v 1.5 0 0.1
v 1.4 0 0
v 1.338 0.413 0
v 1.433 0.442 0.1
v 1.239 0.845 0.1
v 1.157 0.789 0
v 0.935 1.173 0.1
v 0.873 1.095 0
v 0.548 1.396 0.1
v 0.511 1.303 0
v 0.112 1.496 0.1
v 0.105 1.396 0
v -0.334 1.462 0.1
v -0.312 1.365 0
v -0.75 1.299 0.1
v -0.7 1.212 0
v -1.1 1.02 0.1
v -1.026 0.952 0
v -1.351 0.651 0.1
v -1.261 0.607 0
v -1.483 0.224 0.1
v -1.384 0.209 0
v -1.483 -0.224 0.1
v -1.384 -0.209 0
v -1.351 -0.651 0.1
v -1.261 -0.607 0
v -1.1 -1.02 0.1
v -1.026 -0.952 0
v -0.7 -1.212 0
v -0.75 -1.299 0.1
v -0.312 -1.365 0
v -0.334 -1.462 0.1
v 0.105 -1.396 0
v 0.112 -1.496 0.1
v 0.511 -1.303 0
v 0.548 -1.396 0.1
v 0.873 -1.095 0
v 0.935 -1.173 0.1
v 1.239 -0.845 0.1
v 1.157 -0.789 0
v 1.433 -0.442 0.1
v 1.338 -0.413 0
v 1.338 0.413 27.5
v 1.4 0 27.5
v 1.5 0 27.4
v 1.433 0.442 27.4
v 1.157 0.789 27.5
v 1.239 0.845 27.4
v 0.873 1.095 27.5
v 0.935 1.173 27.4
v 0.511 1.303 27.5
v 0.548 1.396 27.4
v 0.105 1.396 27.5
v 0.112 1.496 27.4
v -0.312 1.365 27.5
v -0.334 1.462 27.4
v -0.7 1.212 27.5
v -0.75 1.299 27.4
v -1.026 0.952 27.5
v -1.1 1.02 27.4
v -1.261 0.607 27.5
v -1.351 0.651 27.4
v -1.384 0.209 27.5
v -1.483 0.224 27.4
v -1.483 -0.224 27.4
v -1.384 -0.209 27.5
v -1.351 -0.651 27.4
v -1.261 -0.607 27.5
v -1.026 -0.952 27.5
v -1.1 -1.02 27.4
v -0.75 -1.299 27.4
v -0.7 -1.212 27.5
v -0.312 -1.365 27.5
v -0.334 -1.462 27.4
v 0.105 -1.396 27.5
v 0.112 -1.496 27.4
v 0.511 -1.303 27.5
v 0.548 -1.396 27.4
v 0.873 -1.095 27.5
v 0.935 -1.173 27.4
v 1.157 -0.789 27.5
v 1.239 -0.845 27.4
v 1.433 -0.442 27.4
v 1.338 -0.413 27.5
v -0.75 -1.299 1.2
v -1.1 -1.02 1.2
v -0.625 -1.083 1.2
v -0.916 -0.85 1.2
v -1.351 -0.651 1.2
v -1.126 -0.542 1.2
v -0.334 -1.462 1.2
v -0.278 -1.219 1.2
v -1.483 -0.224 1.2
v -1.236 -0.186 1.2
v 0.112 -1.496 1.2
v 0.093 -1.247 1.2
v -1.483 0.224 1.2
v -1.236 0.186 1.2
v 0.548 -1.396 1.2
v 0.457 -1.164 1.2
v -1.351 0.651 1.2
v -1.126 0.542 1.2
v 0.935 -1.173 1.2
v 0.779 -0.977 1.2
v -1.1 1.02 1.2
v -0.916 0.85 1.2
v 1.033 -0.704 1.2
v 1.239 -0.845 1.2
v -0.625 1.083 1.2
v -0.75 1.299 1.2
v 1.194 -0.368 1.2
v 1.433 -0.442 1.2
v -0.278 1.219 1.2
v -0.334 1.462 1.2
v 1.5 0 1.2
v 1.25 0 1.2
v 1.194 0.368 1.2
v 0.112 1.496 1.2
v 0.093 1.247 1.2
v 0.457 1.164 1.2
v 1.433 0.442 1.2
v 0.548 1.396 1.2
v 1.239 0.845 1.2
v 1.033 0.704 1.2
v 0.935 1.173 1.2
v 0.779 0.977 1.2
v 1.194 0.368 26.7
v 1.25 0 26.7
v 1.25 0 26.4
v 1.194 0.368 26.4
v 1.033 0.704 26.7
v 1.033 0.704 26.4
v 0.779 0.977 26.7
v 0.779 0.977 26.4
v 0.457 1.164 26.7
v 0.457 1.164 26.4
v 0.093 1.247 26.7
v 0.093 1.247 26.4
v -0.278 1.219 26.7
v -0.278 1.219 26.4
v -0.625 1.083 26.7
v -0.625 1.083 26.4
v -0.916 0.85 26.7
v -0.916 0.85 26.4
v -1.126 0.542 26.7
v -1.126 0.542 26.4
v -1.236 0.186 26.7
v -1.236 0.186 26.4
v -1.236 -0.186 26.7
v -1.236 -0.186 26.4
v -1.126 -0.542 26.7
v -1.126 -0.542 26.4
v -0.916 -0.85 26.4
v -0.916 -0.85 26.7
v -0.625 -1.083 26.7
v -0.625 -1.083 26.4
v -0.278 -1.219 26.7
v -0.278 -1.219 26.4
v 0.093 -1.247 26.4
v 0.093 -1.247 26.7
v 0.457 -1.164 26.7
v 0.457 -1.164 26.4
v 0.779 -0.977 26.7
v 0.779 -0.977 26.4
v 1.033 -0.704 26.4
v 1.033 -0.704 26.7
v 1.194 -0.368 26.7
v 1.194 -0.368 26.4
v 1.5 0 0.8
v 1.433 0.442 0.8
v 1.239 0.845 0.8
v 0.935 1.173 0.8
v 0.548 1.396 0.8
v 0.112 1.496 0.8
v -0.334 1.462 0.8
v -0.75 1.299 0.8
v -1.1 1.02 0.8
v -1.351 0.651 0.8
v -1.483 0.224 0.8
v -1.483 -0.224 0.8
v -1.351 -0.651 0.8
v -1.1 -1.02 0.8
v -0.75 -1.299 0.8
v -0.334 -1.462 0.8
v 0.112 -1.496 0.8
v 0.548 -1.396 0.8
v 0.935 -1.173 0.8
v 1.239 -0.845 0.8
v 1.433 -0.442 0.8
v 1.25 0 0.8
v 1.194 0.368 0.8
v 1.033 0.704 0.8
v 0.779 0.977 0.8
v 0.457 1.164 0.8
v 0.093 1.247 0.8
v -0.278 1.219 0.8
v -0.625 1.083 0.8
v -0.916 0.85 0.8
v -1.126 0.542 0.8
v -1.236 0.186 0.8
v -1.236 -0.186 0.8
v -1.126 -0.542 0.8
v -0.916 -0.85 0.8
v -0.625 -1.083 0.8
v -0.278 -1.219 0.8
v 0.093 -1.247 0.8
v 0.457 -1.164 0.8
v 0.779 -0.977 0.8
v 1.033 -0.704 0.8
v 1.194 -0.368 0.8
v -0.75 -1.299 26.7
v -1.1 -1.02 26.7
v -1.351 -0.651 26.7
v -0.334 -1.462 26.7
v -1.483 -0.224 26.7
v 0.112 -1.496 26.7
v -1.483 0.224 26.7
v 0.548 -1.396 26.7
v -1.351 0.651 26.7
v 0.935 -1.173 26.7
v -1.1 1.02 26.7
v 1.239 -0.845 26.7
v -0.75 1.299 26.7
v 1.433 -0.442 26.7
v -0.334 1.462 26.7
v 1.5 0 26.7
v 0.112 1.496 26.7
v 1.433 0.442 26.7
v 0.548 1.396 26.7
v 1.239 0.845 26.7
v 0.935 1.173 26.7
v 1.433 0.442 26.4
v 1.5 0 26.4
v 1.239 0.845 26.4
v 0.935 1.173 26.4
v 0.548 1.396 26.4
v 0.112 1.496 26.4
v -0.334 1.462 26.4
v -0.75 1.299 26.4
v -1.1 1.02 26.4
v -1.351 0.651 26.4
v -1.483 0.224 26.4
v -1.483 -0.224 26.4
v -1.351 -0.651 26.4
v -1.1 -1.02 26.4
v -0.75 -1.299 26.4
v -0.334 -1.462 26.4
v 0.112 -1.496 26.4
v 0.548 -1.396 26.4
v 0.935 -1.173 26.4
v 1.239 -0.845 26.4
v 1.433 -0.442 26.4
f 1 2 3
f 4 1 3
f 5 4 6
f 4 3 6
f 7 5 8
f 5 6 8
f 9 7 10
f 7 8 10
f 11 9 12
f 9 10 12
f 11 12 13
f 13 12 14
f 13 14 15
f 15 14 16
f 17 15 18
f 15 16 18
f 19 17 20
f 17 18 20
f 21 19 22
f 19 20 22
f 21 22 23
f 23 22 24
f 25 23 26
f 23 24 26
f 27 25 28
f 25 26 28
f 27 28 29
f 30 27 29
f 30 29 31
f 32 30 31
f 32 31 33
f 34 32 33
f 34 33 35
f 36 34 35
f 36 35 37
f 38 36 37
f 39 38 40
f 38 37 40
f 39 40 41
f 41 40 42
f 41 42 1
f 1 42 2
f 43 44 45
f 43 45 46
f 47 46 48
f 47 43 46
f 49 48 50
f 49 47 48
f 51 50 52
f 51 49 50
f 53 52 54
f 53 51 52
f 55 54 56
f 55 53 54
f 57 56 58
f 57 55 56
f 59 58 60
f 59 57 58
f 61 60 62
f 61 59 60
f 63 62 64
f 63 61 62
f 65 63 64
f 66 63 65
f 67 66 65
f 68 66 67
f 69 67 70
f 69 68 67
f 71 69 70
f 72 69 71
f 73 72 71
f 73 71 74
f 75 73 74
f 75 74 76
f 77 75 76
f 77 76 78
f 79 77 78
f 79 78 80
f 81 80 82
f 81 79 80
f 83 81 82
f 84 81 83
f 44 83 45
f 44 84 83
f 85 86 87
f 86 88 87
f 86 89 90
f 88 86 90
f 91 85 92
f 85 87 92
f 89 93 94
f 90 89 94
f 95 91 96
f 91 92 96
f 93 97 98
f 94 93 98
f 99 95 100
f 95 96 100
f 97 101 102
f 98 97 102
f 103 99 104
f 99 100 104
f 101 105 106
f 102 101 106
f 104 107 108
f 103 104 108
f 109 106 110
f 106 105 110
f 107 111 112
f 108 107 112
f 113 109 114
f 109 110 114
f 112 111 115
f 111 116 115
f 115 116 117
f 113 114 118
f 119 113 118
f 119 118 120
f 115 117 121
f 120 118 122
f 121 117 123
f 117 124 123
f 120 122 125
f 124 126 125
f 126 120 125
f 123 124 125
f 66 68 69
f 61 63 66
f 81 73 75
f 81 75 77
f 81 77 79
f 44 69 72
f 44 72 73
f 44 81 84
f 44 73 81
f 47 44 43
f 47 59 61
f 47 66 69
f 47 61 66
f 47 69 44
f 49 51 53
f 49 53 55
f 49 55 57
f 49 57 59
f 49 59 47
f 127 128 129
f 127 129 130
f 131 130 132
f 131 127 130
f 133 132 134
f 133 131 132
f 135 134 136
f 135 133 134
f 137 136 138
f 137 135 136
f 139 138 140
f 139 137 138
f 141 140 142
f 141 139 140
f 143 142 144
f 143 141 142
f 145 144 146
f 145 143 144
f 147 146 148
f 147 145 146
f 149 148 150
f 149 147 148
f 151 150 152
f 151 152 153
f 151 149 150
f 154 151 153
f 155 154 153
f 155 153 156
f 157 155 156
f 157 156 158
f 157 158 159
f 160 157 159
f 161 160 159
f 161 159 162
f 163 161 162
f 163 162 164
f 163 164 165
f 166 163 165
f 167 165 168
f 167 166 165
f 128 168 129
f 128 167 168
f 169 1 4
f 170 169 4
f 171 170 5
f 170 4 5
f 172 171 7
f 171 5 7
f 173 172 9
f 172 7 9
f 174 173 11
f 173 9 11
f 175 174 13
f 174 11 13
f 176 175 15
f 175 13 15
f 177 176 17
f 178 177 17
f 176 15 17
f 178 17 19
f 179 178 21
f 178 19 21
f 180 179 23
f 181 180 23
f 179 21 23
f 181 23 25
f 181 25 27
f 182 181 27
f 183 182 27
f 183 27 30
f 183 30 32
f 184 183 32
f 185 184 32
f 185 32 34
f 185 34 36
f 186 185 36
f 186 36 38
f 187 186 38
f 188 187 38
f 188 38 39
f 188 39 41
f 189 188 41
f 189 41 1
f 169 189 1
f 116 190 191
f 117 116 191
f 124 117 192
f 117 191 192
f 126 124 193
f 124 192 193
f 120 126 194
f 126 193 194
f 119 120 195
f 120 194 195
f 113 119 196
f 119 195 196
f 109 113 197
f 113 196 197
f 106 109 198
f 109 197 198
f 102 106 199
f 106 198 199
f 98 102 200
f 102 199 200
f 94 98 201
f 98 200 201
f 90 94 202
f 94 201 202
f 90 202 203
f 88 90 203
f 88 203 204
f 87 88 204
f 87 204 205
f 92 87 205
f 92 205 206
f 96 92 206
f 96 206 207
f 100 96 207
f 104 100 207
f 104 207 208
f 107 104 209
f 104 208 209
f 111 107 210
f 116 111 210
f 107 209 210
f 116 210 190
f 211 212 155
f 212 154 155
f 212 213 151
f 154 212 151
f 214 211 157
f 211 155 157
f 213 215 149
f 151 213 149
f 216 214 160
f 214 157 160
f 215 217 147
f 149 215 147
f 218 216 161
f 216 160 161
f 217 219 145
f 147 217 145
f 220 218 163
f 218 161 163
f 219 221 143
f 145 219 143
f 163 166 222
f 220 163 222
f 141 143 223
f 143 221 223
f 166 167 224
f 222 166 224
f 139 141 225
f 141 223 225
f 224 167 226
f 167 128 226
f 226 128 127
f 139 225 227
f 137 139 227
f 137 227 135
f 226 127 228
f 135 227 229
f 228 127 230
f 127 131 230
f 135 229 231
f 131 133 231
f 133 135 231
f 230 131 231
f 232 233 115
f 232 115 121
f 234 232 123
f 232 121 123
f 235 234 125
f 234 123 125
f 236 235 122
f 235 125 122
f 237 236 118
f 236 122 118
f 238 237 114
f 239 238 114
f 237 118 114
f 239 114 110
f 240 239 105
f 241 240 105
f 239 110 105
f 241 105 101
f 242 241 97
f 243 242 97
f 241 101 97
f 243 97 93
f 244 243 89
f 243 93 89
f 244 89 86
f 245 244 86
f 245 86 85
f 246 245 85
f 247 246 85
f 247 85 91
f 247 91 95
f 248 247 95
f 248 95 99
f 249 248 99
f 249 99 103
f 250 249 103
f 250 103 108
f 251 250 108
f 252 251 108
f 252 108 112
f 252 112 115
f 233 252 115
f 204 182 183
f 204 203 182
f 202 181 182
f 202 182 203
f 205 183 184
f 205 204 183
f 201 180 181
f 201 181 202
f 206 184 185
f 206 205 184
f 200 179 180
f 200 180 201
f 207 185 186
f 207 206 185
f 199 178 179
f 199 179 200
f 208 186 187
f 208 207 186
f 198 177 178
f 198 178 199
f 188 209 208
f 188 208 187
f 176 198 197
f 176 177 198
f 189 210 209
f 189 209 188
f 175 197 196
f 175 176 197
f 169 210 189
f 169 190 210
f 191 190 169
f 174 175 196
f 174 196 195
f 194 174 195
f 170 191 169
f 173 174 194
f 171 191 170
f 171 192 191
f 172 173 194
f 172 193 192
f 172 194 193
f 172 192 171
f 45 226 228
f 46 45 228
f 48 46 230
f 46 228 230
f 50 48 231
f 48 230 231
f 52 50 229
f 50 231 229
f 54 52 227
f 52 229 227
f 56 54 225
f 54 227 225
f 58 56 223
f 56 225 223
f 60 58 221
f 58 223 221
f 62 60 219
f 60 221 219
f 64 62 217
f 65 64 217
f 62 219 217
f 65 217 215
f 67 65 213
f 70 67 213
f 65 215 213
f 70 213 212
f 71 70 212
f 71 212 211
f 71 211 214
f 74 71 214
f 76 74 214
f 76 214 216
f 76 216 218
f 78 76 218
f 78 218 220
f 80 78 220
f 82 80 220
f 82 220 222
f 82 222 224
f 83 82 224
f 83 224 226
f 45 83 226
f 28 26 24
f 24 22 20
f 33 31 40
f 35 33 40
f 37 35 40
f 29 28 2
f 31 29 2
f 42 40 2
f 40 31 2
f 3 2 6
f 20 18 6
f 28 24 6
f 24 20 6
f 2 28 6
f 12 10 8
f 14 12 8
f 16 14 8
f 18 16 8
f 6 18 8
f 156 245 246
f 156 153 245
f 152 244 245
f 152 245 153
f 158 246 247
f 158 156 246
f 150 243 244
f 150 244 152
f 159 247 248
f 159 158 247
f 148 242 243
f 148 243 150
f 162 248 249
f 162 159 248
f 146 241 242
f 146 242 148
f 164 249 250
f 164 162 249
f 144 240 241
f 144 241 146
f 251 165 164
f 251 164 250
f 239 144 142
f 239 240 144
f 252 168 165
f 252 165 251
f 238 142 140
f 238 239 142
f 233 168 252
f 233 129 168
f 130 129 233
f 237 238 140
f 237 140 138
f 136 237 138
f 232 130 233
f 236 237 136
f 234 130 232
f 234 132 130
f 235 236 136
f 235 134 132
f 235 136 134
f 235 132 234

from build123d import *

# Parameters (mm, degrees)
SKETCH_1_R          = 1.5
EXTRUDE_1_DEPTH     = 27.5
SKETCH_2_R          = 1.5
SKETCH_2_R_2        = 1.25
CUT_EXTRUDE_1_DEPTH = 0.4
SKETCH_3_R          = 1.5
SKETCH_3_R_2        = 1.25
CUT_EXTRUDE_2_DEPTH = 0.3
CHAMFER_1_SIZE      = 0.1


with BuildPart() as part:
    # 草图1 → 凸台-拉伸1 (new body)
    with BuildSketch(Plane.XY):
        Circle(SKETCH_1_R)
    extrude(amount=EXTRUDE_1_DEPTH)

    # 草图2 → 切除-拉伸1 (cut)
    with BuildSketch(Plane.XY.offset(0.8)):
        Circle(SKETCH_2_R)
        Circle(SKETCH_2_R_2, mode=Mode.SUBTRACT)
    extrude(amount=CUT_EXTRUDE_1_DEPTH, mode=Mode.SUBTRACT)

    # 草图3 → 切除-拉伸2 (cut)
    with BuildSketch(Plane.XY.offset(26.7)):
        Circle(SKETCH_3_R)
        Circle(SKETCH_3_R_2, mode=Mode.SUBTRACT)
    extrude(amount=-CUT_EXTRUDE_2_DEPTH, mode=Mode.SUBTRACT)

    # 倒角1
    chamfer_1_edges = [part.edges().sort_by_distance(p)[0] for p in [
        (-1.5, 0, 0),
        (-1.5, 0, 27.5),
    ]]
    chamfer(chamfer_1_edges, length=CHAMFER_1_SIZE)


solid = part.part
